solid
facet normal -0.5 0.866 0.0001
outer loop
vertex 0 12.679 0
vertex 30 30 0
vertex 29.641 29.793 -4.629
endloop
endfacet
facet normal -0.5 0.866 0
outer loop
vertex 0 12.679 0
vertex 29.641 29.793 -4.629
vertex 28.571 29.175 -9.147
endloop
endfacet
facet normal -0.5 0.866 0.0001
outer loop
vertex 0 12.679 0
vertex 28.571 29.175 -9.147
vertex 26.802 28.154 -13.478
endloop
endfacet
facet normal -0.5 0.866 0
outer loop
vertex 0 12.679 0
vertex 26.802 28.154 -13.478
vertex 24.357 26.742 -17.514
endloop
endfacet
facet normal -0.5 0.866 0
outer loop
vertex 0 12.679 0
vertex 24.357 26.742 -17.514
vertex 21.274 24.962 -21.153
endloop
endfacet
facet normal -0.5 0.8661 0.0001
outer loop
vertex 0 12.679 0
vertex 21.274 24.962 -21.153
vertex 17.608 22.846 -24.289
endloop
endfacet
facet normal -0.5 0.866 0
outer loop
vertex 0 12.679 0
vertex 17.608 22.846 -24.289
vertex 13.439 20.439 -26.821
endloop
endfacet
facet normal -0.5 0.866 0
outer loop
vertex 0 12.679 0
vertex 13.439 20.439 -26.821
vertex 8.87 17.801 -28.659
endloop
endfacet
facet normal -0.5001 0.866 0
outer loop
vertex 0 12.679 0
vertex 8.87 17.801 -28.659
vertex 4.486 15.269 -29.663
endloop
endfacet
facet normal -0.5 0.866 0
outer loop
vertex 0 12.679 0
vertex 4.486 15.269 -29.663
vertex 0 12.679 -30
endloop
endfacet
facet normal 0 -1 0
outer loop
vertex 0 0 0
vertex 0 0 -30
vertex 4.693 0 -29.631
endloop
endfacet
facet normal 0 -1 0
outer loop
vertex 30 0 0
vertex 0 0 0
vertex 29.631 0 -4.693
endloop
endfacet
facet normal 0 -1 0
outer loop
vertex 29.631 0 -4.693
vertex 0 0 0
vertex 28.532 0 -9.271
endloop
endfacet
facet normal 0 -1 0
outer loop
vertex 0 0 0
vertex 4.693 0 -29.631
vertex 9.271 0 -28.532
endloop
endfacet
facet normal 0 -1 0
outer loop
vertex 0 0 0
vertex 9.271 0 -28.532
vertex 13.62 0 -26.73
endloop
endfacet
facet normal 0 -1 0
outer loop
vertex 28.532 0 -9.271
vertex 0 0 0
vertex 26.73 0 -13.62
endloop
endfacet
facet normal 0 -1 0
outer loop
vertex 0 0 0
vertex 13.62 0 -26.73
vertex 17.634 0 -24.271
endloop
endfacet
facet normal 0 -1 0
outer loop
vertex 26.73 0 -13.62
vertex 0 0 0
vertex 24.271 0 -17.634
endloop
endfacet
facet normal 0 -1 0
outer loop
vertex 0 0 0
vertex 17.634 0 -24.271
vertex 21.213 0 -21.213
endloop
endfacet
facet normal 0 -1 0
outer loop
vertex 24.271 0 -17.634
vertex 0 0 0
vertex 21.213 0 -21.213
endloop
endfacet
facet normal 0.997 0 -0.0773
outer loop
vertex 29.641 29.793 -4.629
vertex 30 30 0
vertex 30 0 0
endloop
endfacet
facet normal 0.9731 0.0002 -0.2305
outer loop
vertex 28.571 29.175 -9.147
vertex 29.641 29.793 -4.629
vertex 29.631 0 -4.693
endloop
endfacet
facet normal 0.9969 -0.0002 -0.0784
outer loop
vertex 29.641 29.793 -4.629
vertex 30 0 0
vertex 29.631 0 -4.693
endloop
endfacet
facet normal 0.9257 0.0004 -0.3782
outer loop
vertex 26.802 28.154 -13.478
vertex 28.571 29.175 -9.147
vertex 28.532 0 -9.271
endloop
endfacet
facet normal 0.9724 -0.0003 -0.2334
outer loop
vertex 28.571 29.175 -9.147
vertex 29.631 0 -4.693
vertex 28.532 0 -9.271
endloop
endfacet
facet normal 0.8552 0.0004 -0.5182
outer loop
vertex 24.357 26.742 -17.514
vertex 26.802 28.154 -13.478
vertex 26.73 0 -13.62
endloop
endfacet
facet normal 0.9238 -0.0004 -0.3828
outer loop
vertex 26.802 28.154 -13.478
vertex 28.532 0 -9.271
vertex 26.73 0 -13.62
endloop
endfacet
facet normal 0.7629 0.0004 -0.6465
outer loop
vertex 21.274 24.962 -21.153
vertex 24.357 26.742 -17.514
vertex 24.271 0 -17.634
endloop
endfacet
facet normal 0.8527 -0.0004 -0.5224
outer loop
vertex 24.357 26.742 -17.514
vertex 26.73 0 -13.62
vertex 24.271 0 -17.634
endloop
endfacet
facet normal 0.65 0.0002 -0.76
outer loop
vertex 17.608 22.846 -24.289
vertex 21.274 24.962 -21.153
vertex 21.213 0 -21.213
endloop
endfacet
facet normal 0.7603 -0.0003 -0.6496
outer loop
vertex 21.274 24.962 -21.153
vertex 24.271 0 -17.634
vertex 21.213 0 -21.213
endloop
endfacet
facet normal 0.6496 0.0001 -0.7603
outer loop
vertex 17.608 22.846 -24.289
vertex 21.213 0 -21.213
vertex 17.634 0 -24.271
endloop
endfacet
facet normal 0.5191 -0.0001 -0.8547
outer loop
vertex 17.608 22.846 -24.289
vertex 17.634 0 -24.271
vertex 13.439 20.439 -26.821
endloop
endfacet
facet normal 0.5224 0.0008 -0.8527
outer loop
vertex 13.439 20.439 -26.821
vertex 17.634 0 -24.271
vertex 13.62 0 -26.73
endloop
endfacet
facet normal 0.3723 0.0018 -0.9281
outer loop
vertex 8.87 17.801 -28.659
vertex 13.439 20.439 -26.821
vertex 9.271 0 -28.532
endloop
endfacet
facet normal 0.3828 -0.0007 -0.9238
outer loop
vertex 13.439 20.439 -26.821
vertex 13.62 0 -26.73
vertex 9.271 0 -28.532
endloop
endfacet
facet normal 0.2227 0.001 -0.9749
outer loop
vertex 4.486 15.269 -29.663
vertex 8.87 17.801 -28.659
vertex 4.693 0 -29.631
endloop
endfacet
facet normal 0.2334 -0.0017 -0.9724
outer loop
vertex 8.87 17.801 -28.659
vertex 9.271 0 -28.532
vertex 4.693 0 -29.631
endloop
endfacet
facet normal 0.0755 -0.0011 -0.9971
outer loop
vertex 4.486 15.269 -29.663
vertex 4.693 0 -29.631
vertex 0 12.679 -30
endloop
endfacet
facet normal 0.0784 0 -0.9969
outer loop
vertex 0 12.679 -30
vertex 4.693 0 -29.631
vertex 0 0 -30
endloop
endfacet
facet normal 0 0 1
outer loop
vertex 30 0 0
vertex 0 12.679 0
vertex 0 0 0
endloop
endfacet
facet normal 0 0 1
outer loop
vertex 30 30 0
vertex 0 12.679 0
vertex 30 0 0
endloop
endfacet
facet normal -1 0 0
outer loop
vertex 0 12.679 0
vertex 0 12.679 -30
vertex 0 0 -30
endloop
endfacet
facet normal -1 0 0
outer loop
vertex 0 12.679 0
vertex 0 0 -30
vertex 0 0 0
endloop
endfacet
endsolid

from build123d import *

# Parameters (mm, degrees)
ESBO_O1_R                = 30
RESSALTO_EXTRUS_O1_DEPTH = 30
CORTE_EXTRUS_O1_DEPTH    = 30
CORTE_EXTRUS_O2_DEPTH    = 31


with BuildPart() as part:
    # Esboço1 → Ressalto-extrusão1 (new body)
    with BuildSketch(Plane(origin=(0, 0, 0), x_dir=(1, 0, 0), z_dir=(0, 1, 0))):
        Circle(ESBO_O1_R)
    extrude(amount=RESSALTO_EXTRUS_O1_DEPTH)

    # Esboço2 → Corte-extrusão1 (cut)
    with BuildSketch(Plane(origin=(0, 30, 0), x_dir=(1, 0, 0), z_dir=(0, 1, 0))):
        with BuildLine():
            Line((0, 30), (0, 0))
            Line((0, 0), (30, 0))
            ThreePointArc((30, 0), (-21.213203436, -21.213203436), (0, 30))
        make_face()
    extrude(amount=-CORTE_EXTRUS_O1_DEPTH, mode=Mode.SUBTRACT)

    # Esboço3 → Corte-extrusão2 (cut, through all)
    with BuildSketch(Plane.XY):
        Polygon((30, 30), (0, 12.679491924), (0, 30), align=None)
    extrude(amount=-CORTE_EXTRUS_O2_DEPTH, mode=Mode.SUBTRACT)


solid = part.part
